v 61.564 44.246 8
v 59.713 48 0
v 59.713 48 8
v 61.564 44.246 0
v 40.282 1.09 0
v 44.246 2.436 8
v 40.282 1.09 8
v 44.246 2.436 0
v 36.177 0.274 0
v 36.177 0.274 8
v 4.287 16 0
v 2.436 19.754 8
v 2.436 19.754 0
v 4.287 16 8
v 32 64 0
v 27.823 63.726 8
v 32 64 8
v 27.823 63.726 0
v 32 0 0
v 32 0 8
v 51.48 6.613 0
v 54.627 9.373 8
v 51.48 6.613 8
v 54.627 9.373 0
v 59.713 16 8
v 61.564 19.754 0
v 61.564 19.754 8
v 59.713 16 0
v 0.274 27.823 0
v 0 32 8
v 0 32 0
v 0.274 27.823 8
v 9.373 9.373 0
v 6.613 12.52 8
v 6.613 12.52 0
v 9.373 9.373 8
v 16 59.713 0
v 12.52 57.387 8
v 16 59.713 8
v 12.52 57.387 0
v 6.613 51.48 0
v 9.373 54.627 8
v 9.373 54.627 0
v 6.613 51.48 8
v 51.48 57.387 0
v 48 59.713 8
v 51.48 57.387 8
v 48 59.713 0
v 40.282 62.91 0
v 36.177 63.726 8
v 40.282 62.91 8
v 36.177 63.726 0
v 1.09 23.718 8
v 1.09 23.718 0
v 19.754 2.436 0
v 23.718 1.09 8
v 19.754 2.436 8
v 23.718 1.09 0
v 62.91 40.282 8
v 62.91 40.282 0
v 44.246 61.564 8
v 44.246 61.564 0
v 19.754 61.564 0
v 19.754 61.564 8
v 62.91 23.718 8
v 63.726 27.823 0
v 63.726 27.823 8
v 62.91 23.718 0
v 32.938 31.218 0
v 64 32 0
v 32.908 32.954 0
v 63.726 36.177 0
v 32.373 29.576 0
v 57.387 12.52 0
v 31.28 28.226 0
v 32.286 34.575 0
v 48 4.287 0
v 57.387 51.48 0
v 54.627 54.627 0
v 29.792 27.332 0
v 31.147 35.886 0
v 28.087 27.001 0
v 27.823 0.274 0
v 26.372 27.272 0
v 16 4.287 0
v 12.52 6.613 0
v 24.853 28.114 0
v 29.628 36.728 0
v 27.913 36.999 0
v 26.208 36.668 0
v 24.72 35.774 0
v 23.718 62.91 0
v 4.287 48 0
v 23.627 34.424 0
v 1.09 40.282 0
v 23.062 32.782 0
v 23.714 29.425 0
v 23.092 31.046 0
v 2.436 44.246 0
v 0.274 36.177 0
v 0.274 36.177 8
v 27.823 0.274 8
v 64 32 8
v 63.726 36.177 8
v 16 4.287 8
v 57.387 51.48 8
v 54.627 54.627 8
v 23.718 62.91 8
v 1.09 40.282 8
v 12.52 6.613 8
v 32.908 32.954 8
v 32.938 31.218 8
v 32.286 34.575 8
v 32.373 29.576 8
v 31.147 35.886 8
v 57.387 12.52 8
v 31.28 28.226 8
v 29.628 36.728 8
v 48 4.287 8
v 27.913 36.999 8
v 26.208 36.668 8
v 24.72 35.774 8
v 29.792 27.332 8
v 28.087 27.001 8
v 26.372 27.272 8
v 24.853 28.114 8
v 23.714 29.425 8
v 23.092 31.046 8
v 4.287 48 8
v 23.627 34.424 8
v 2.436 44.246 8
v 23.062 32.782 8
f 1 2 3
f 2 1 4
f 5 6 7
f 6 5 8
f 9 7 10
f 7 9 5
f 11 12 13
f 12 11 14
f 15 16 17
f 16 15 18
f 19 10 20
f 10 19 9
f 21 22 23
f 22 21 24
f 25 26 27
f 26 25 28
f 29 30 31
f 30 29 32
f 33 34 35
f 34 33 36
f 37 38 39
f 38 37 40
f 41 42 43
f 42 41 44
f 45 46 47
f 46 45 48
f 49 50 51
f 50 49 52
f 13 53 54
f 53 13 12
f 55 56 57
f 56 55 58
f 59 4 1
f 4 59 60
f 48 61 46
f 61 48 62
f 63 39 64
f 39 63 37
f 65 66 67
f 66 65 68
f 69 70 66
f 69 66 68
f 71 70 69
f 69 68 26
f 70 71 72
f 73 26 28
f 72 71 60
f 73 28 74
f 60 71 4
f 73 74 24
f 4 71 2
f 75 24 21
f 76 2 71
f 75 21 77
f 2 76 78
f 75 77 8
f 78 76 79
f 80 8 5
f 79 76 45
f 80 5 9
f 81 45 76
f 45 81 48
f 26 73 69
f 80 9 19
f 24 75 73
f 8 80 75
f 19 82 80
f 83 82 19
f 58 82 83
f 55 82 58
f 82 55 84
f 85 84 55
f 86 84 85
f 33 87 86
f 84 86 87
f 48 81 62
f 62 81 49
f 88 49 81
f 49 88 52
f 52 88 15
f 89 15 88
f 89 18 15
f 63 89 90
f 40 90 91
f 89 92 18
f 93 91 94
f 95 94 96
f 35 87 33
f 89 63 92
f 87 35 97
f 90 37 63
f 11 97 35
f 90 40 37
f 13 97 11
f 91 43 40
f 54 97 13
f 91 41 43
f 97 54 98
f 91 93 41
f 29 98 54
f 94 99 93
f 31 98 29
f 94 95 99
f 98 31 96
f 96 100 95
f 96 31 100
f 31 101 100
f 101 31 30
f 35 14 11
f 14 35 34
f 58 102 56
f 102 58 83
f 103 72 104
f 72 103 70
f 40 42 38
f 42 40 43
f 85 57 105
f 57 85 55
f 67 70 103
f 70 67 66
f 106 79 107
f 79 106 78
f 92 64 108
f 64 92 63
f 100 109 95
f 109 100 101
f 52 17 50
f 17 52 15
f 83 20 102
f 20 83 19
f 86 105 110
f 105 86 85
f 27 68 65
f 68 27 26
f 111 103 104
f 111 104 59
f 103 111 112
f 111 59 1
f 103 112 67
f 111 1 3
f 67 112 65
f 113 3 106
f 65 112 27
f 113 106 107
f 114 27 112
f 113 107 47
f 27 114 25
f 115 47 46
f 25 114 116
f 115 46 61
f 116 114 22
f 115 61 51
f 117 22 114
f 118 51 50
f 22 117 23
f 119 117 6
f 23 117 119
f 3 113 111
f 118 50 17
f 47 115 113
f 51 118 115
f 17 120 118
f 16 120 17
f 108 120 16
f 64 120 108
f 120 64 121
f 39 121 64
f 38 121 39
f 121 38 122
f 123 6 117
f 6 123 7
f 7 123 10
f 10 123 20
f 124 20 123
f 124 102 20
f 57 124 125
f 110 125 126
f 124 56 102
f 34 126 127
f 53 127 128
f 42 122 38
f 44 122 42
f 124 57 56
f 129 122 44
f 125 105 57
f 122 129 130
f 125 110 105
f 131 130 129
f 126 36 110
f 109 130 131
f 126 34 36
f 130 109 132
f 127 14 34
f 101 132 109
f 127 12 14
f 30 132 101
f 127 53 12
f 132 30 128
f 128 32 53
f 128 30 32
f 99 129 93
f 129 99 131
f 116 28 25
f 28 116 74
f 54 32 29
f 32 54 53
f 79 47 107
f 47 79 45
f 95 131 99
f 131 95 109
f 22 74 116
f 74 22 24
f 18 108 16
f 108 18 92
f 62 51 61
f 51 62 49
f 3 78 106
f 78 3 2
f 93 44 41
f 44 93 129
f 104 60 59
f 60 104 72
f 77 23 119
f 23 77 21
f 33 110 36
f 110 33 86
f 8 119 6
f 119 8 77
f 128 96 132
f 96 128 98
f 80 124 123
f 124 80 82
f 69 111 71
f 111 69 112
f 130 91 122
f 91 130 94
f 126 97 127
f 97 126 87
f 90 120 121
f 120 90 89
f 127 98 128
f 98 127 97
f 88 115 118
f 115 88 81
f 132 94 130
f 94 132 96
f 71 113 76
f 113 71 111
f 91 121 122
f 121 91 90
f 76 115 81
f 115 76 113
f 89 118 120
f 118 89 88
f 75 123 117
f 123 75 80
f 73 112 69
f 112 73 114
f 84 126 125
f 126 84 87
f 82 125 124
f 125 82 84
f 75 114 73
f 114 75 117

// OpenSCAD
$fn = 32;

// ----------------------------------------------------------------------
// Cam plate: eccentric cam, base R32
// ----------------------------------------------------------------------

// --- parameters (mm) ---
base_r = 32;              // base circle radius
lobe_h = 14;              // cam lobe rise
bore_r = 5;               // shaft bore radius
plate_t = 8;              // plate thickness, Z (extrusion height)
ecc = 4;                  // disc eccentricity

profile = [[64, 32], [63.726, 36.177], [62.91, 40.282], [61.564, 44.246], [59.713, 48], [57.387, 51.48], [54.627, 54.627], [51.48, 57.387], [48, 59.713], [44.246, 61.564], [40.282, 62.91], [36.177, 63.726], [32, 64], [27.823, 63.726], [23.718, 62.91], [19.754, 61.564], [16, 59.713], [12.52, 57.387], [9.373, 54.627], [6.613, 51.48], [4.287, 48], [2.436, 44.246], [1.09, 40.282], [0.274, 36.177], [0, 32], [0.274, 27.823], [1.09, 23.718], [2.436, 19.754], [4.287, 16], [6.613, 12.52], [9.373, 9.373], [12.52, 6.613], [16, 4.287], [19.754, 2.436], [23.718, 1.09], [27.823, 0.274], [32, 0], [36.177, 0.274], [40.282, 1.09], [44.246, 2.436], [48, 4.287], [51.48, 6.613], [54.627, 9.373], [57.387, 12.52], [59.713, 16], [61.564, 19.754], [62.91, 23.718], [63.726, 27.823]];  // primary outline, 48 points, counter clockwise
void_1 = [[32.908, 32.954], [32.286, 34.575], [31.147, 35.886], [29.628, 36.728], [27.913, 36.999], [26.208, 36.668], [24.72, 35.774], [23.627, 34.424], [23.062, 32.782], [23.092, 31.046], [23.714, 29.425], [24.853, 28.114], [26.372, 27.272], [28.087, 27.001], [29.792, 27.332], [31.28, 28.226], [32.373, 29.576], [32.938, 31.218]];  // shaft bore, 18 points

// --- the one profile operation ---
difference() {
  linear_extrude(height = plate_t) polygon(points = profile);
  translate([0, 0, -1])
    linear_extrude(height = plate_t + 2) polygon(points = void_1);
}
